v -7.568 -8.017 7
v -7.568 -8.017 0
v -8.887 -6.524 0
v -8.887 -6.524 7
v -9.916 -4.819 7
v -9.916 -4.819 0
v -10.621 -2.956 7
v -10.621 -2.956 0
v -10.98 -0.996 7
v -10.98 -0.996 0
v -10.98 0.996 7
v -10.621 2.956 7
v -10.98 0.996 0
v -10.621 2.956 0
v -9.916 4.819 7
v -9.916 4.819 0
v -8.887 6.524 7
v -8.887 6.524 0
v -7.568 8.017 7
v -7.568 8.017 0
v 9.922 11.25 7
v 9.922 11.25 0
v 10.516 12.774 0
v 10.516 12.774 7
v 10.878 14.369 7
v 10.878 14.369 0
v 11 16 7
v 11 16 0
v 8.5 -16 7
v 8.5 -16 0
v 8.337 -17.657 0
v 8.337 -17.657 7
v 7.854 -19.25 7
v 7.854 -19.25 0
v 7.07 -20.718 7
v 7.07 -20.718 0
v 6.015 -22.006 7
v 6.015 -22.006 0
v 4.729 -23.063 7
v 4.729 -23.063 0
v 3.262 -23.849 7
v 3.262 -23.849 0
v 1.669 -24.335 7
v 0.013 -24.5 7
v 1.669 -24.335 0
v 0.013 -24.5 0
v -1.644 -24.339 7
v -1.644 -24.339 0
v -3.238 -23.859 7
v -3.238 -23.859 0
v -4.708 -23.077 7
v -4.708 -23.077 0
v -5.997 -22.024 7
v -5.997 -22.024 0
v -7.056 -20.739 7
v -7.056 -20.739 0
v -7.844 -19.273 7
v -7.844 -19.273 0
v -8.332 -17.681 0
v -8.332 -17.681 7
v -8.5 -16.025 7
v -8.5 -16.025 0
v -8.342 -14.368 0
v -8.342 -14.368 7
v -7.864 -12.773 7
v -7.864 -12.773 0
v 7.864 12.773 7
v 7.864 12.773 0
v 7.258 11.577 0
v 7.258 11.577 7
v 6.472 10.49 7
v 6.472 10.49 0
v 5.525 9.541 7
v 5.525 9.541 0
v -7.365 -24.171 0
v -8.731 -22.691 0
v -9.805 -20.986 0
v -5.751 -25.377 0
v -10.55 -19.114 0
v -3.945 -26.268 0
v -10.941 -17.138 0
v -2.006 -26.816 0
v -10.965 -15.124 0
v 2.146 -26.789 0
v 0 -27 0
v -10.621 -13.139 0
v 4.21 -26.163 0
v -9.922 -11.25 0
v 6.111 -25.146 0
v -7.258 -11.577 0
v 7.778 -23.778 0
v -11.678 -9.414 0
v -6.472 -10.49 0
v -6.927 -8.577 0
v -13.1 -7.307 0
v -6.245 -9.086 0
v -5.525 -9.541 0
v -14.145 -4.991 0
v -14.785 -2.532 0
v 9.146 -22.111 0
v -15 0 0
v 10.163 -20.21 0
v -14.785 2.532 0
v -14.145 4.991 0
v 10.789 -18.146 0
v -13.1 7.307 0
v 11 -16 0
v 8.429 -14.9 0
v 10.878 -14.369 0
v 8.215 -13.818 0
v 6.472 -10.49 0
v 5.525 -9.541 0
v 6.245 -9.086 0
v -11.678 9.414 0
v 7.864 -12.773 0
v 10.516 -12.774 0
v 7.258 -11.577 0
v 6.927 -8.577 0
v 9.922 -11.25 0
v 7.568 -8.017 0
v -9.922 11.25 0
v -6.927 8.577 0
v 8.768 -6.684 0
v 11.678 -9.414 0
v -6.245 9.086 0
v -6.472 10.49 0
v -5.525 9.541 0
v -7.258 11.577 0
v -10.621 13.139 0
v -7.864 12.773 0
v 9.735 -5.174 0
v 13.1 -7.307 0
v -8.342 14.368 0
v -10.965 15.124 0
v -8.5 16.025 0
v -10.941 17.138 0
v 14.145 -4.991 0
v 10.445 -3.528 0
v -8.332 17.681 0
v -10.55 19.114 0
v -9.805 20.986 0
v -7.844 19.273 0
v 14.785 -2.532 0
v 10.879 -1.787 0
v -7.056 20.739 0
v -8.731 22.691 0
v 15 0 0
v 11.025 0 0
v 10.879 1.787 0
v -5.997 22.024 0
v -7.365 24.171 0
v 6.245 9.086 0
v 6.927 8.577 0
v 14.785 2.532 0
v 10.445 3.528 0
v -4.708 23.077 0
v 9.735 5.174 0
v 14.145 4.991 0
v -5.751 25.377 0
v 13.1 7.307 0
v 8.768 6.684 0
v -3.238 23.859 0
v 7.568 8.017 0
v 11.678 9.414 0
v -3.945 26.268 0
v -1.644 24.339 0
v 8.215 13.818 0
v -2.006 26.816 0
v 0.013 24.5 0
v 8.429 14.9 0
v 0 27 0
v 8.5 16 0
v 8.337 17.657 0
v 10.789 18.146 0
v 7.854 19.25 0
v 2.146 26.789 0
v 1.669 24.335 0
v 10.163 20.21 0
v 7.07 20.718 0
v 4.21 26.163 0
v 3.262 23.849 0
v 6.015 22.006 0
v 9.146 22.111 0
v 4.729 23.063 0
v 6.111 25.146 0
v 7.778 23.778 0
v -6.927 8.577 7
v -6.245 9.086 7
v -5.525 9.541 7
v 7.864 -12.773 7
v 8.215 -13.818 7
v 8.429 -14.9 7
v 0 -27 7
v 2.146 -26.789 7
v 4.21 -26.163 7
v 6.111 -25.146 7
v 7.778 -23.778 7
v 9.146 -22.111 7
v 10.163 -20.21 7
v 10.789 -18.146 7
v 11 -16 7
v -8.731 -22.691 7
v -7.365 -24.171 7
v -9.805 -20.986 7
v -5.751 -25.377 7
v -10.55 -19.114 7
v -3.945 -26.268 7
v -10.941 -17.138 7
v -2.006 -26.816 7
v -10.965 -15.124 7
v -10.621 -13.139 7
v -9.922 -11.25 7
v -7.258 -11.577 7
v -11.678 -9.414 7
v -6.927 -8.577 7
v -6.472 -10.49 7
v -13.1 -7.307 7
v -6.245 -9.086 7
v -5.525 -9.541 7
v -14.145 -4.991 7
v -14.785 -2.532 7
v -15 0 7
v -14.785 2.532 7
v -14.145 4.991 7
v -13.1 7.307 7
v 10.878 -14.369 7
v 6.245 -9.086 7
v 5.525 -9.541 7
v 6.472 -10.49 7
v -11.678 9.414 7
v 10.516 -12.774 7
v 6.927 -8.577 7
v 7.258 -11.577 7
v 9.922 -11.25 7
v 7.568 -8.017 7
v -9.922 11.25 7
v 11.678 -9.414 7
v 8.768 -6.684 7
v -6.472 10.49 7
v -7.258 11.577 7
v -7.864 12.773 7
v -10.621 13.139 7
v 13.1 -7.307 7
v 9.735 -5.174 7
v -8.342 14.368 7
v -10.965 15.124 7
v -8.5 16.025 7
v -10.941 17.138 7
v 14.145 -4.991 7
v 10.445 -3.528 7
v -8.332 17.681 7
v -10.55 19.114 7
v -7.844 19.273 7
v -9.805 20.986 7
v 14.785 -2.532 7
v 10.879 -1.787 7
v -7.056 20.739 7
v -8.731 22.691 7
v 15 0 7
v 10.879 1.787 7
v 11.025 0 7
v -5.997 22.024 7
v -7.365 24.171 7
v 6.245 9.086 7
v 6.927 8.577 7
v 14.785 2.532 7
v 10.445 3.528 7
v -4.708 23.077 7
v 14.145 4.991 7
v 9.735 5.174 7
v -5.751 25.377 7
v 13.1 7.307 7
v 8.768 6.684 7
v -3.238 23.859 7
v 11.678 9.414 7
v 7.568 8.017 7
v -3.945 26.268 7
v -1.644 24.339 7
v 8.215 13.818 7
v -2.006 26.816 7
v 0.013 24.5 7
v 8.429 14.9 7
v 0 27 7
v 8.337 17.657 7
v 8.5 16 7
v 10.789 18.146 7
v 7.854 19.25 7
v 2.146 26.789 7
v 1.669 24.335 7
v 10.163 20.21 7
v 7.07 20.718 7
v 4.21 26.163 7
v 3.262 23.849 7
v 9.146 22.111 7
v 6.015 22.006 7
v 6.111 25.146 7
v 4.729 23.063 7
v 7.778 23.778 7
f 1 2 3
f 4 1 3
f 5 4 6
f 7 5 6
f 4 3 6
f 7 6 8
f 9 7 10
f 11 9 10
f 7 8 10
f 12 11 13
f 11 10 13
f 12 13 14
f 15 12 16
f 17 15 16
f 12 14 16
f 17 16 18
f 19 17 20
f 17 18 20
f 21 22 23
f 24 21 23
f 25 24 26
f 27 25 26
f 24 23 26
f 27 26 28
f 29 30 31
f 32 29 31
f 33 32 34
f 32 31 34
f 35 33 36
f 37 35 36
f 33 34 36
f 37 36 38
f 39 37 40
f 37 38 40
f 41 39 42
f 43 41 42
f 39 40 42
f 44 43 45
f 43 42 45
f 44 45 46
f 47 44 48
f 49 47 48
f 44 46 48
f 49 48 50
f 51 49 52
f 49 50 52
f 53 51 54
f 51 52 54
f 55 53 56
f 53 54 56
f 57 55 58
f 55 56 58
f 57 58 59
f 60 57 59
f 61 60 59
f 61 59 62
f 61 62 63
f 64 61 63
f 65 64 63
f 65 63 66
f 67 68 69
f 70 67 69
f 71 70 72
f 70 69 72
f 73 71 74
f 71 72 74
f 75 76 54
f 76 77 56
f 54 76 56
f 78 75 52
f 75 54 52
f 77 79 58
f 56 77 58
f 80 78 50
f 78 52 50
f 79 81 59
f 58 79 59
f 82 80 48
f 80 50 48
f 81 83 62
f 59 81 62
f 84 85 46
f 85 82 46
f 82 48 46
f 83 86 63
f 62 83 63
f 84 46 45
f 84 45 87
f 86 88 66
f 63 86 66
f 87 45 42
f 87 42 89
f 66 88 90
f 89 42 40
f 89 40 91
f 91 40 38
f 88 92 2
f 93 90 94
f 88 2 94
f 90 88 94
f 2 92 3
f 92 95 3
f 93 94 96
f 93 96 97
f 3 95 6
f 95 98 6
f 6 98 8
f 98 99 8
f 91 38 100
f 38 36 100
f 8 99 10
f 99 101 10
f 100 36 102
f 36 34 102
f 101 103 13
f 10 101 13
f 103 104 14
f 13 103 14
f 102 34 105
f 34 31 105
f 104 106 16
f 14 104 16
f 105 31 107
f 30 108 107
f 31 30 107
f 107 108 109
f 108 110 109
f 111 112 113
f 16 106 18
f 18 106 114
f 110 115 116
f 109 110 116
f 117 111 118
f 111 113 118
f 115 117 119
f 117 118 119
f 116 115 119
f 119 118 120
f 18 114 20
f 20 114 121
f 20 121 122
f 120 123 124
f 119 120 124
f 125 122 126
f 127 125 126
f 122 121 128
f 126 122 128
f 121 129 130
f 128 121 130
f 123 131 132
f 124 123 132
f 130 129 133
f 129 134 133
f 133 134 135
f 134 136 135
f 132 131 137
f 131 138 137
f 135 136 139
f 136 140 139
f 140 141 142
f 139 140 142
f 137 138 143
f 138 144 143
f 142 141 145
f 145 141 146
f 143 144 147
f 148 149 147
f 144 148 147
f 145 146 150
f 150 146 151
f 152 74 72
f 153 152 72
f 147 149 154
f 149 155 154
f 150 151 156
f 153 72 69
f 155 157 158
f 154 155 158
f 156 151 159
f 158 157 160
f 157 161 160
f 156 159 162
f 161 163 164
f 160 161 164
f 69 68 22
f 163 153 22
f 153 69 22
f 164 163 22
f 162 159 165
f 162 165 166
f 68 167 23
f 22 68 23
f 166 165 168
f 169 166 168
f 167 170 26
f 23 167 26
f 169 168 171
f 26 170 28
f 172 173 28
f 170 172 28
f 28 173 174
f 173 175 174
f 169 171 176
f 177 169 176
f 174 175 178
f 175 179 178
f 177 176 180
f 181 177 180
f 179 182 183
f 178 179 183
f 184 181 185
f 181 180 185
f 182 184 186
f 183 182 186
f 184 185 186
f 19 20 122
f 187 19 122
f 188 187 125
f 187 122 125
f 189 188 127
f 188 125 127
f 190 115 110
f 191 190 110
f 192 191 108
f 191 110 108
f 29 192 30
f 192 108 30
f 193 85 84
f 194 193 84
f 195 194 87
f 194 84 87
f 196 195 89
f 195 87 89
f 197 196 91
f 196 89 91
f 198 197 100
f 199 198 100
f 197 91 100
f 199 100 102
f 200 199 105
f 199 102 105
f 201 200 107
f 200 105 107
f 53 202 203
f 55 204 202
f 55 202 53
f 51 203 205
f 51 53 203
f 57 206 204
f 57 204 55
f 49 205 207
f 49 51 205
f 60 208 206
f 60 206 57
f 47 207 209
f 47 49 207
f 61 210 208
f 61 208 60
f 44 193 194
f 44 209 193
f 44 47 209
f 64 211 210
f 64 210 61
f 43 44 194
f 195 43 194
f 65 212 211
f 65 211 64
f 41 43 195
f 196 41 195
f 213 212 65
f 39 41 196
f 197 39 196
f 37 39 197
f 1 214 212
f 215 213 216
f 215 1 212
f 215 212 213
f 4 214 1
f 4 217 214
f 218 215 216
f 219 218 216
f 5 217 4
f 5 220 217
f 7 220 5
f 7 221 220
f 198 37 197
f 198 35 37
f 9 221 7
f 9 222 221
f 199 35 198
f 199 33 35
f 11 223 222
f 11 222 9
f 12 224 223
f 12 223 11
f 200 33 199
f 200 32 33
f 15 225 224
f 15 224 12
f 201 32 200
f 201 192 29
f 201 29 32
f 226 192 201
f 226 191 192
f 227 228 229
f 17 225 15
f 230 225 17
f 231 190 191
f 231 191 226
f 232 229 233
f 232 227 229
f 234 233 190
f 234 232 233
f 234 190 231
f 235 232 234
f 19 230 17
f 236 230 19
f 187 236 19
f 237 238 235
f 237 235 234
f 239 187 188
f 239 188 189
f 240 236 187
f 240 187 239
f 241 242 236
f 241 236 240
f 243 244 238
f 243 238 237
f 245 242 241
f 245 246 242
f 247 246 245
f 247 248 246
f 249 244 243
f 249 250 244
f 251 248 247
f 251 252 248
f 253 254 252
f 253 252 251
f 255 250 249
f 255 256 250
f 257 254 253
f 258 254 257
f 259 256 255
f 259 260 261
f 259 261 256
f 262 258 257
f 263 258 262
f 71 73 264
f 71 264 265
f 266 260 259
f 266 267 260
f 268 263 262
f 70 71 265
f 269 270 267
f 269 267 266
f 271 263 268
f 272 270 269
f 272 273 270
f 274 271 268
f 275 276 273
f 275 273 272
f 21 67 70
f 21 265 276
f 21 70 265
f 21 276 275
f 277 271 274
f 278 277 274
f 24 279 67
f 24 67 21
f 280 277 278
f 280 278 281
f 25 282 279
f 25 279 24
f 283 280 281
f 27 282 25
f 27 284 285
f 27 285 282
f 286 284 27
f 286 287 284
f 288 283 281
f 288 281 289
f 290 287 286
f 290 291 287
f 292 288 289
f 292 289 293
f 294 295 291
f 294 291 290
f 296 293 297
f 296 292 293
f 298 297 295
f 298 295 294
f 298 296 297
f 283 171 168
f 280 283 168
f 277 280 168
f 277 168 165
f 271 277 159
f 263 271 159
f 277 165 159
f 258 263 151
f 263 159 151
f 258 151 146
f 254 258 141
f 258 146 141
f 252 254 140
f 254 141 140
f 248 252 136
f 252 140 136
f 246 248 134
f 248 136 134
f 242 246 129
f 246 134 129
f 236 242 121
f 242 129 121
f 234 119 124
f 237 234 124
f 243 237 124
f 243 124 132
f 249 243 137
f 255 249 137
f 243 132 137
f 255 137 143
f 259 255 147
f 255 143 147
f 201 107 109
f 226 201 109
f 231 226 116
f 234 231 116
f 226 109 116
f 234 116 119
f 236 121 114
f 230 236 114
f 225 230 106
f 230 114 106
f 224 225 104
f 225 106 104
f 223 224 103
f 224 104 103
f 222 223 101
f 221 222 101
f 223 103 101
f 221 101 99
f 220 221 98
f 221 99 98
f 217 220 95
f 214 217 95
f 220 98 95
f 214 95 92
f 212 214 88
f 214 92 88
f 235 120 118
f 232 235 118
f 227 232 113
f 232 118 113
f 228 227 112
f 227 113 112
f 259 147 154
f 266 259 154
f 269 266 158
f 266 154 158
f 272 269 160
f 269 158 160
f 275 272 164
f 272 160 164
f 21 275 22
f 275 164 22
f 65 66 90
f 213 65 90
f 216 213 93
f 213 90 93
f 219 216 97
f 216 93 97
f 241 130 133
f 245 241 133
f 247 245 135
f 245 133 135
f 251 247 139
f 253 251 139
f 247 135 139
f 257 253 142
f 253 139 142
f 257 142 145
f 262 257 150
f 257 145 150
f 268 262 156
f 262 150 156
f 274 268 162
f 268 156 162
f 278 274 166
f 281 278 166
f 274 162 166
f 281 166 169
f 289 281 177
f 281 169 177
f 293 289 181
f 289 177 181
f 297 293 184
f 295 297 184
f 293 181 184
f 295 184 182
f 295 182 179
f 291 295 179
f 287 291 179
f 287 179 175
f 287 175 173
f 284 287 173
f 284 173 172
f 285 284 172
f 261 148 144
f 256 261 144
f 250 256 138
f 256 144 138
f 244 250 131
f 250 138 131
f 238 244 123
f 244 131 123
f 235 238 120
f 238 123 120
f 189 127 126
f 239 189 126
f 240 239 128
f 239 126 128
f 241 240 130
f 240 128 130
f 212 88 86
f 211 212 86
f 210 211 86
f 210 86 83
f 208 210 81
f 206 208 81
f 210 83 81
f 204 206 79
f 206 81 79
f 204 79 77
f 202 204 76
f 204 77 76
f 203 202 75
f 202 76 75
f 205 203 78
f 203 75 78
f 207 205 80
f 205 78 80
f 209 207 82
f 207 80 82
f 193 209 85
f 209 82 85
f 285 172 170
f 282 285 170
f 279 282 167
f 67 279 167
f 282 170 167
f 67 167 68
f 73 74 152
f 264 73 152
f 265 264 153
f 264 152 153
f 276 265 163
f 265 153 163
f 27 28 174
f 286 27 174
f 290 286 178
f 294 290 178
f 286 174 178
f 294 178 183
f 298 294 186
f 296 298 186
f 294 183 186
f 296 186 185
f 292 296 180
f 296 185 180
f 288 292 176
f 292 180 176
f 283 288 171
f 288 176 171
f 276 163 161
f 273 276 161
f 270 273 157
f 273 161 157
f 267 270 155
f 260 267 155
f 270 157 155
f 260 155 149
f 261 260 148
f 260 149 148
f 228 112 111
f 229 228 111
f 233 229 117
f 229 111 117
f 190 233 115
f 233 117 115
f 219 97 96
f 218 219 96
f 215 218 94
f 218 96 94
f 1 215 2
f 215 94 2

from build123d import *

# Parameters (mm, degrees)
F1_DEPTH = 7


with BuildPart() as f1:
    # F0 (on Top) → F1 (new body)
    with BuildSketch(Plane.XY):
        with BuildLine():
            ThreePointArc((7.5680259261, 8.0172070312), (10.1239347794, 4.3653830969), (11.025, 0))
            ThreePointArc((11.025, 0), (10.1239347794, -4.3653830969), (7.5680259261, -8.0172070312))
            ThreePointArc((7.5680259261, -8.0172070313), (8.8929301367, -9.5257592273), (9.9215674165, -11.25))
            ThreePointArc((9.9215674165, -11.25), (13.6715674165, -6.1715674165), (15, 0))
            ThreePointArc((15, 0), (13.6715674165, 6.1715674165), (9.9215674165, 11.25))
            ThreePointArc((9.9215674165, 11.25), (8.8929301367, 9.5257592273), (7.5680259261, 8.0172070312))
        make_face()
        with BuildLine():
            ThreePointArc((5.5250997211, 9.5406445313), (6.5907283556, 8.8381516587), (7.5680259261, 8.0172070312))
            ThreePointArc((7.5680259261, 8.0172070312), (8.8929301367, 9.5257592273), (9.9215674165, 11.25))
            ThreePointArc((9.9215674165, 11.25), (8.9252455049, 12.0557037405), (7.863796439, 12.7734375))
            ThreePointArc((7.863796439, 12.7734375), (6.8868260245, 11.0178691999), (5.5250997211, 9.5406445312))
        make_face()
        with BuildLine():
            ThreePointArc((9.9215674165, -11.25), (8.8929301367, -9.5257592273), (7.5680259261, -8.0172070313))
            ThreePointArc((7.5680259261, -8.0172070312), (6.5907283556, -8.8381516587), (5.5250997211, -9.5406445313))
            ThreePointArc((5.5250997211, -9.5406445312), (6.8868260245, -11.0178691999), (7.863796439, -12.7734375))
            ThreePointArc((7.863796439, -12.7734375), (8.9252455049, -12.0557037405), (9.9215674165, -11.25))
        make_face()
        with BuildLine():
            ThreePointArc((7.863796439, 12.7734375), (8.9252455049, 12.0557037405), (9.9215674165, 11.25))
            ThreePointArc((9.9215674165, 11.25), (10.7270042785, 13.5645576974), (11, 16))
            ThreePointArc((11, 16), (7.7781745931, 23.7781745931), (0, 27))
            Line((0, 27), (0, 24.5))
            ThreePointArc((0, 24.5), (6.0104076401, 22.0104076401), (8.5, 16))
            ThreePointArc((8.5, 16), (8.3394325266, 14.3556566252), (7.863796439, 12.7734375))
        make_face()
        with BuildLine():
            ThreePointArc((11, -16), (10.7270042785, -13.5645576974), (9.9215674165, -11.25))
            ThreePointArc((9.9215674165, -11.25), (8.9252455049, -12.0557037405), (7.863796439, -12.7734375))
            ThreePointArc((7.863796439, -12.7734375), (8.3394325266, -14.3556566252), (8.5, -16))
            ThreePointArc((8.5, -16), (6.0104076401, -22.0104076401), (0, -24.5))
            Line((0, -24.5), (0, -27))
            ThreePointArc((0, -27), (7.7781745931, -23.7781745931), (11, -16))
        make_face()
        with BuildLine():
            ThreePointArc((-9.9215674165, 11.25), (-8.8929301367, 9.5257592273), (-7.5680259261, 8.0172070313))
            ThreePointArc((-7.5680259261, 8.0172070312), (-6.5907283556, 8.8381516587), (-5.5250997211, 9.5406445313))
            ThreePointArc((-5.5250997211, 9.5406445312), (-6.8868260245, 11.0178691999), (-7.863796439, 12.7734375))
            ThreePointArc((-7.863796439, 12.7734375), (-8.9252455049, 12.0557037405), (-9.9215674165, 11.25))
        make_face()
        with BuildLine():
            ThreePointArc((-7.5680259261, -8.0172070312), (-11.025, 0), (-7.5680259261, 8.0172070312))
            ThreePointArc((-7.5680259261, 8.0172070313), (-8.8929301367, 9.5257592273), (-9.9215674165, 11.25))
            ThreePointArc((-9.9215674165, 11.25), (-15, 0), (-9.9215674165, -11.25))
            ThreePointArc((-9.9215674165, -11.25), (-8.8929301367, -9.5257592273), (-7.5680259261, -8.0172070313))
        make_face()
        with BuildLine():
            ThreePointArc((-5.5250997211, -9.5406445313), (-6.5907283556, -8.8381516587), (-7.5680259261, -8.0172070312))
            ThreePointArc((-7.5680259261, -8.0172070313), (-8.8929301367, -9.5257592273), (-9.9215674165, -11.25))
            ThreePointArc((-9.9215674165, -11.25), (-8.9252455049, -12.0557037405), (-7.863796439, -12.7734375))
            ThreePointArc((-7.863796439, -12.7734375), (-6.8868260245, -11.0178691999), (-5.5250997211, -9.5406445312))
        make_face()
        with BuildLine():
            ThreePointArc((0, 27), (-9.3072552345, 21.8630196998), (-9.9215674165, 11.25))
            ThreePointArc((-9.9215674165, 11.25), (-8.9252455049, 12.0557037405), (-7.863796439, 12.7734375))
            ThreePointArc((-7.863796439, 12.7734375), (-7.0595956417, 20.7341429399), (0, 24.5))
            Line((0, 24.5), (0, 27))
        make_face()
        with BuildLine():
            ThreePointArc((-9.9215674165, -11.25), (-9.3072552345, -21.8630196998), (0, -27))
            Line((0, -27), (0, -24.5))
            ThreePointArc((0, -24.5), (-7.0595956417, -20.7341429399), (-7.863796439, -12.7734375))
            ThreePointArc((-7.863796439, -12.7734375), (-8.9252455049, -12.0557037405), (-9.9215674165, -11.25))
        make_face()
    extrude(amount=F1_DEPTH)


solid = f1.part
